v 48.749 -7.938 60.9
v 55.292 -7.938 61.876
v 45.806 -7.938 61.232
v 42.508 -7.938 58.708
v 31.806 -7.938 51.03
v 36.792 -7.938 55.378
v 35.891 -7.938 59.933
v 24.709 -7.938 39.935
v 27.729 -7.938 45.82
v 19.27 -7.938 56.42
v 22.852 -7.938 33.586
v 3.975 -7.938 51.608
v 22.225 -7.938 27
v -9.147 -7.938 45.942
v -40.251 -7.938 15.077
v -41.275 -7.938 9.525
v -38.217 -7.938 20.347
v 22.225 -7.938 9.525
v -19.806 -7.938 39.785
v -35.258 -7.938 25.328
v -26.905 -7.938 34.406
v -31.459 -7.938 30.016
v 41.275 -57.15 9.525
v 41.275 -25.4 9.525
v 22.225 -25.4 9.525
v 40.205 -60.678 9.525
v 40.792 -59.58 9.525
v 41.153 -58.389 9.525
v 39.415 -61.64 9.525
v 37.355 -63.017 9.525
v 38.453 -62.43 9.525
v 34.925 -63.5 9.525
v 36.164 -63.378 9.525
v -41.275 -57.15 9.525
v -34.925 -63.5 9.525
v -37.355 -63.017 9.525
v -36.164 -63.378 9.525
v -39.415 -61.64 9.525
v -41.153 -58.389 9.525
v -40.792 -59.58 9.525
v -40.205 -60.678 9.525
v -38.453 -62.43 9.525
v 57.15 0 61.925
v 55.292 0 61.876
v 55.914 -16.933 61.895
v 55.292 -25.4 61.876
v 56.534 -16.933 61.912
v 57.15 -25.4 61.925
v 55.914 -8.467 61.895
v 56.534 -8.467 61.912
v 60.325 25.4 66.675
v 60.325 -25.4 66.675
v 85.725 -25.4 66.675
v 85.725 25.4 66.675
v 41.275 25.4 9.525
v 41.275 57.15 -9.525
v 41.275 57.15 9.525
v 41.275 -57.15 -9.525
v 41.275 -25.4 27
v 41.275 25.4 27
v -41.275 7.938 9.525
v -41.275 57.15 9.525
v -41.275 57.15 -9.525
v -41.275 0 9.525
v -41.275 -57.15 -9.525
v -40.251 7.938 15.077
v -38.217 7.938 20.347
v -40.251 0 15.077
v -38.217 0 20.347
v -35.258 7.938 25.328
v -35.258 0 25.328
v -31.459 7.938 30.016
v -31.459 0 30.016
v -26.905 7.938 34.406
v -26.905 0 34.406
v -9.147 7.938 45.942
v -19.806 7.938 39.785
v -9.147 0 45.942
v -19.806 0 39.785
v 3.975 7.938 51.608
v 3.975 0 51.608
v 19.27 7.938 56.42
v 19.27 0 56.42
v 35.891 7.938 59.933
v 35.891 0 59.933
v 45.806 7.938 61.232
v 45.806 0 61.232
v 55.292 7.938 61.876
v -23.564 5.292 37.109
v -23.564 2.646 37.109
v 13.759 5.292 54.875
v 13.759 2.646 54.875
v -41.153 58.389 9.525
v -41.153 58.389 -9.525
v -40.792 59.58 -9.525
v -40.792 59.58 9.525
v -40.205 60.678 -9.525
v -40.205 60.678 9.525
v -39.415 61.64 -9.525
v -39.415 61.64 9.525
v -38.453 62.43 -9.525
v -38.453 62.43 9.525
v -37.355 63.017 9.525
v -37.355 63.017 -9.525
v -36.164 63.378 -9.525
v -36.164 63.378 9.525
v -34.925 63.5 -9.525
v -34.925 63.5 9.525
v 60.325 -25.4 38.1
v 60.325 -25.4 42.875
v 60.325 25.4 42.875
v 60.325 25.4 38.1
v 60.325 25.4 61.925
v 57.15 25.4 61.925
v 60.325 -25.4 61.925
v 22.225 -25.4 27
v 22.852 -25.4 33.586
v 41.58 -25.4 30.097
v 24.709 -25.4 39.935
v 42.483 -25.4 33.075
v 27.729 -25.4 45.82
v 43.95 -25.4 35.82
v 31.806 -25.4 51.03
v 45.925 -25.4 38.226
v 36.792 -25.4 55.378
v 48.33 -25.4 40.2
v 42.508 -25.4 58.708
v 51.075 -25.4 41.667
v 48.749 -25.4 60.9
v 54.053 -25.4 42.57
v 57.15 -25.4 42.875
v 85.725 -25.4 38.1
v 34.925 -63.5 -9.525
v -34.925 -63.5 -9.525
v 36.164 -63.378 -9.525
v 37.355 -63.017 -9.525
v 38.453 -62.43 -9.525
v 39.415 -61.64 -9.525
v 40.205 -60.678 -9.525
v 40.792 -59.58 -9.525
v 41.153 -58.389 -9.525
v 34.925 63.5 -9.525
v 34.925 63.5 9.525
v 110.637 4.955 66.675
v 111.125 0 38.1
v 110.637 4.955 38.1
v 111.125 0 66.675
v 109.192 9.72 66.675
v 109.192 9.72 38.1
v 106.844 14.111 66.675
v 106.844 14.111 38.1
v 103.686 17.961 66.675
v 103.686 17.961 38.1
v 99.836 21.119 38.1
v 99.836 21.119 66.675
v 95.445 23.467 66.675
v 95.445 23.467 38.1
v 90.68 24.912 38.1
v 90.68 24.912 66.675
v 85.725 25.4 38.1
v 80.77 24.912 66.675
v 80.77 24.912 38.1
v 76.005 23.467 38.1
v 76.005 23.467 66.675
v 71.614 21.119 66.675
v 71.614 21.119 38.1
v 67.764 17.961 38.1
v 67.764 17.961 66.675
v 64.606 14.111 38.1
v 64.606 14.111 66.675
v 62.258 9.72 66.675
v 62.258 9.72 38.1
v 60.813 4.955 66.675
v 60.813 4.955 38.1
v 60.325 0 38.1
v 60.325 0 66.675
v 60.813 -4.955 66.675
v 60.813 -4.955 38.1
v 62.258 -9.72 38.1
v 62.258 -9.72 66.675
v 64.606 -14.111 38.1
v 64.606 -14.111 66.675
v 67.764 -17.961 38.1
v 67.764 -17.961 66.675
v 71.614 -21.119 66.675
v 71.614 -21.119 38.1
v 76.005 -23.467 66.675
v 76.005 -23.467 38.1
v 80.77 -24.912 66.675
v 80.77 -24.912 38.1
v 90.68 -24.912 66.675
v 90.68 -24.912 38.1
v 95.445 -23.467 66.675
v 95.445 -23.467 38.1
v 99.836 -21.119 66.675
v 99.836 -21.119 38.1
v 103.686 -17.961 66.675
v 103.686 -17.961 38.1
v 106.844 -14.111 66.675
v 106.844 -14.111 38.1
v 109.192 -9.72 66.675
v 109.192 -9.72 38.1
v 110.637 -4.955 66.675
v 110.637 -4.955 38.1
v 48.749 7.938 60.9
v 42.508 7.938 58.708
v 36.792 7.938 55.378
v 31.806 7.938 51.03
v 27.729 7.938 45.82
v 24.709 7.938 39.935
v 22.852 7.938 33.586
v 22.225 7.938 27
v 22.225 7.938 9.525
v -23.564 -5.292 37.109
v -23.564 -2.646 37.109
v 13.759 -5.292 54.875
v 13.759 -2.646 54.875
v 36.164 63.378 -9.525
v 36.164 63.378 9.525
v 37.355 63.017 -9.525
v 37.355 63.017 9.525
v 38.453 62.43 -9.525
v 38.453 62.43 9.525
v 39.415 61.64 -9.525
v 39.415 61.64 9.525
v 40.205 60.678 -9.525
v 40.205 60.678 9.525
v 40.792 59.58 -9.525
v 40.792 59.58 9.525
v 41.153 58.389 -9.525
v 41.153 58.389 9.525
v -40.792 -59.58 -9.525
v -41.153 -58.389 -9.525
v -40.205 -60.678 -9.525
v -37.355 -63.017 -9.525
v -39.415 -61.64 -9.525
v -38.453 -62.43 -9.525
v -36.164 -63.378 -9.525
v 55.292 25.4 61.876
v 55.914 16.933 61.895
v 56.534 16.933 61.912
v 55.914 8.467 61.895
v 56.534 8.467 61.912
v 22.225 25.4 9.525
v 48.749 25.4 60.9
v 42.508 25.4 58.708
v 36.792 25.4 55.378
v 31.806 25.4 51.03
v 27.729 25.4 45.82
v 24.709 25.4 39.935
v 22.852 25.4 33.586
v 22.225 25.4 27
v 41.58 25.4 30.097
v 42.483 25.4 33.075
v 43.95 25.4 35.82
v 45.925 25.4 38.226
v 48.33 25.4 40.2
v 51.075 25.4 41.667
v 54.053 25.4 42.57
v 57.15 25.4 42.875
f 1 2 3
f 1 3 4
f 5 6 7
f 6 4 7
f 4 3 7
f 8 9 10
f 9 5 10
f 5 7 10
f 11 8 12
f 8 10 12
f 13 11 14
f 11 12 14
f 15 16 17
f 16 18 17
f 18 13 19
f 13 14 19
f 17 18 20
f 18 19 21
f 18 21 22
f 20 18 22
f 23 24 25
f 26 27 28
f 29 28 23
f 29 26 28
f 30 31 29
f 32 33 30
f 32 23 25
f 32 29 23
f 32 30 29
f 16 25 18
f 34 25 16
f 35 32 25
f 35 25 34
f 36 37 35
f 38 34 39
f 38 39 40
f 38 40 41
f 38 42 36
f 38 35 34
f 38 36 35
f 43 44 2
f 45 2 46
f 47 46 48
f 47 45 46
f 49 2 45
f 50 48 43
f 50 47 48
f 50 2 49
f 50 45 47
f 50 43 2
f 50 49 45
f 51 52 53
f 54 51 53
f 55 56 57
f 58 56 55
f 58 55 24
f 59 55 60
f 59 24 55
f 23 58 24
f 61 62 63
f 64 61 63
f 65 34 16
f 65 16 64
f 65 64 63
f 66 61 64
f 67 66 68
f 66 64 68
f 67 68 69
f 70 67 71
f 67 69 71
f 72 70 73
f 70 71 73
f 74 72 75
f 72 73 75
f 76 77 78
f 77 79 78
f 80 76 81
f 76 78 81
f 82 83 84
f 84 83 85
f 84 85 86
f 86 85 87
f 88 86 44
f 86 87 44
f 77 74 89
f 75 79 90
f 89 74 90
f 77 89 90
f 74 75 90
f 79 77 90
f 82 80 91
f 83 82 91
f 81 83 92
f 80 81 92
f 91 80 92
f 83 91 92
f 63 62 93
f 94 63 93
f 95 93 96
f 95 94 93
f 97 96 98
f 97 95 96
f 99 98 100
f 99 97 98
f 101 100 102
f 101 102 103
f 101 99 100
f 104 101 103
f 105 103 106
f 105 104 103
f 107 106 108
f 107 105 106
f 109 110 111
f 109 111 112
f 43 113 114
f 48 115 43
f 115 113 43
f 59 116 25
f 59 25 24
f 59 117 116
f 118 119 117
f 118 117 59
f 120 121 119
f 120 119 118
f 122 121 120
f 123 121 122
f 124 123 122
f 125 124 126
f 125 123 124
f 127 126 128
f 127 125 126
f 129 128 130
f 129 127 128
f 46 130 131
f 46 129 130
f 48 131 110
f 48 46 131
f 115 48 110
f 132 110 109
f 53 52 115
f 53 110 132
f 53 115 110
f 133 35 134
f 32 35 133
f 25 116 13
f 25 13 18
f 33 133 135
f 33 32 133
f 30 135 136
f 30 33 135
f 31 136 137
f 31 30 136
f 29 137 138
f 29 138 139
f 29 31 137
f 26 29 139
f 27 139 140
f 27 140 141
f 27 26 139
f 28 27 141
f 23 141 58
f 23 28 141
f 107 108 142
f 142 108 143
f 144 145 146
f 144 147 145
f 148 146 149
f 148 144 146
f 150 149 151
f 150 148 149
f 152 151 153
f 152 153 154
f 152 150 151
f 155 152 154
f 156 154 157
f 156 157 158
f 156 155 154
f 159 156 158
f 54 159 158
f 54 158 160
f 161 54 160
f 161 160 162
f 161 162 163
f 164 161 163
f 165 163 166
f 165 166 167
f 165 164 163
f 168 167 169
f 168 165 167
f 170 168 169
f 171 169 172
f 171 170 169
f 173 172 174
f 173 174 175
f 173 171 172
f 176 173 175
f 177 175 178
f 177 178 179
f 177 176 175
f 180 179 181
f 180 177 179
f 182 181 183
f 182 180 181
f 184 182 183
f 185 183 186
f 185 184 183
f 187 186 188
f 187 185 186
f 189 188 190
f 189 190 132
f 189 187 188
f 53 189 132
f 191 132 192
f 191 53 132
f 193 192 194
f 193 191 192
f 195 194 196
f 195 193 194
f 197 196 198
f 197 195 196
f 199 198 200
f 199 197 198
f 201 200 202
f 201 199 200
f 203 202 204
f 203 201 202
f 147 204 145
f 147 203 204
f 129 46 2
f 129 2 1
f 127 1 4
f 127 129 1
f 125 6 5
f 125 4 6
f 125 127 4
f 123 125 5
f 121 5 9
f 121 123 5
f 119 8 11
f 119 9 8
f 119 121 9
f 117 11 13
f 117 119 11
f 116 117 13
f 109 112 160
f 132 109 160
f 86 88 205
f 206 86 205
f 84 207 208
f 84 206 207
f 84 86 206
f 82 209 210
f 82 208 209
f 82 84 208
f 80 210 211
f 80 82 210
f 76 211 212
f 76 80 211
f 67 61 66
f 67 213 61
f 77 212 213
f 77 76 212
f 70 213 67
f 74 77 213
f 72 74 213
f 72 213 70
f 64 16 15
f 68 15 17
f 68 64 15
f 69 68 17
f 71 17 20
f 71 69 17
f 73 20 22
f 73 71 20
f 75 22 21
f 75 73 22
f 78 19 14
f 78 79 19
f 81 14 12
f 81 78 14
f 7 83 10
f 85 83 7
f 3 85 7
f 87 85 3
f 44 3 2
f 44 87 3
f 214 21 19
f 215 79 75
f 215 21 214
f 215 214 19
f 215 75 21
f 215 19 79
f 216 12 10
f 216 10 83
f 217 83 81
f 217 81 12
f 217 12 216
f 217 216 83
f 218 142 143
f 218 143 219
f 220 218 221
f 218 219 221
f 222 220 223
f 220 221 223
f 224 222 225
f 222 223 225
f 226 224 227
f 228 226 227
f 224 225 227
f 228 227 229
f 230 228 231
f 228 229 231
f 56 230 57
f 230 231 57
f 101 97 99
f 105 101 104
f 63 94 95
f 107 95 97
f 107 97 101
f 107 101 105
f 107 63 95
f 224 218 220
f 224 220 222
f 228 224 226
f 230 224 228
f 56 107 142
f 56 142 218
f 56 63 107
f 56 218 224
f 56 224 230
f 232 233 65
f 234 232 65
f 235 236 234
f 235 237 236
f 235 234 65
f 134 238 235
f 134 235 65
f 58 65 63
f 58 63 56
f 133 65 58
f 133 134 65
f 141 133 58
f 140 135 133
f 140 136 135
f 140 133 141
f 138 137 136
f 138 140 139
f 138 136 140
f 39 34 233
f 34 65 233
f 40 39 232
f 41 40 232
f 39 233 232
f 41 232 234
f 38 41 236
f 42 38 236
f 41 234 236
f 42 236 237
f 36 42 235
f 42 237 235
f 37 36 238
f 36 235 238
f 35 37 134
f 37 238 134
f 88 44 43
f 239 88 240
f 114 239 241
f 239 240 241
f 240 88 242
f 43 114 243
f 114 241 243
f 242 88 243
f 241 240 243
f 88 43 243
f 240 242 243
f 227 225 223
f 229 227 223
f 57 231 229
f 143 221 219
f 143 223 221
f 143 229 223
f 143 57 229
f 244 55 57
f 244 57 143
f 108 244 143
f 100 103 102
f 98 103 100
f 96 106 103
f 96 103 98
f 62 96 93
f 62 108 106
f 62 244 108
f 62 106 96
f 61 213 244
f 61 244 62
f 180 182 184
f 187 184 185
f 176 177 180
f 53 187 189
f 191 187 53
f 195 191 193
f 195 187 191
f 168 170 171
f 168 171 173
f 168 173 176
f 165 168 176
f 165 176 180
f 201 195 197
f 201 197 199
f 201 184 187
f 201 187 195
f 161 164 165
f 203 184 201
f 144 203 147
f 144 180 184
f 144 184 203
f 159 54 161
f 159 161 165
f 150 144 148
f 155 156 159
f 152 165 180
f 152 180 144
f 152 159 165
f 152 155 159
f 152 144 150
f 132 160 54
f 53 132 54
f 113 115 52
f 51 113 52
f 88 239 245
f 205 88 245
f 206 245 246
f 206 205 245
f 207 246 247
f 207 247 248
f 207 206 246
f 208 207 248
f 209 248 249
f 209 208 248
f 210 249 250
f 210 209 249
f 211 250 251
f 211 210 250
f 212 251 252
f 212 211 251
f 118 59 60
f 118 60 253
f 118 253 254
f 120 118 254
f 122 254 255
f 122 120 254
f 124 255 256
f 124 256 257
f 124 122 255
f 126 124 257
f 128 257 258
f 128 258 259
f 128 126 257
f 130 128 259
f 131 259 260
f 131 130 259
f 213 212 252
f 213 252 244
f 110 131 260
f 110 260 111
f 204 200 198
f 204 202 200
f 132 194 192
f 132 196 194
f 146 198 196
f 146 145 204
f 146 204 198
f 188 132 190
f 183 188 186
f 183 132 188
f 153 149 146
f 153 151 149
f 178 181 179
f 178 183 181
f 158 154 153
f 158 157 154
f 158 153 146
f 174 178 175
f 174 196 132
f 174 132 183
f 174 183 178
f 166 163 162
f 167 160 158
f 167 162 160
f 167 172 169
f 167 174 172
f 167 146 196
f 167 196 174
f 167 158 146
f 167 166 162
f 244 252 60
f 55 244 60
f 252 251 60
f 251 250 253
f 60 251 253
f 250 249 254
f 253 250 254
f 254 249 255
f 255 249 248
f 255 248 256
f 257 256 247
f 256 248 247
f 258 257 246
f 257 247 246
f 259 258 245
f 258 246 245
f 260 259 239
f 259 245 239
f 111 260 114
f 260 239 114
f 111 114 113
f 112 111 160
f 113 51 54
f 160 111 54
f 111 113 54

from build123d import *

# Parameters (mm, degrees)
F1_DEPTH = 63.5
F0_W     = 25.4
F0_H     = 4.7498
F2_DEPTH = 25.4
F3_DEPTH = 7.9375
F5_R     = 6.35


with BuildPart() as f1:
    # F0 (on Front) → F1 (new body, symmetric)
    with BuildSketch(Plane.XZ):
        Polygon((22.225, 9.525), (-41.275, 9.525), (-41.275, -9.525), (41.275, -9.525), (41.275, 9.525), align=None)
    extrude(amount=F1_DEPTH, both=True)

    # F0 (on Front) → F2 (join, symmetric)
    with BuildSketch(Plane.XZ):
        with BuildLine():
            Line((22.225, 27.0002), (22.225, 9.525))
            Line((22.225, 9.525), (41.275, 9.525))
            Line((41.275, 9.525), (41.275, 27.0002))
            ThreePointArc((41.275, 27.0002), (45.9246798487, 38.2255201513), (57.15, 42.8752))
            Line((57.15, 42.8752), (60.325, 42.8752))
            Line((60.325, 42.8752), (60.325, 61.9252))
            Line((60.325, 61.9252), (57.15, 61.9252))
            add(Edge.make_bspline(
                [(55.2920610912, 61.875745702), (55.9158793834, 61.8968482356), (56.5352906086, 61.9133390458), (57.15, 61.9252)],
                knots=[109.7267842617, 109.7267842617, 109.7267842617, 109.7267842617, 111.5045361635, 111.5045361635, 111.5045361635, 111.5045361635], degree=3))
            ThreePointArc((55.2920610912, 61.875745702), (31.80592632, 51.0300471553), (22.225, 27.0002))
        make_face()
        Polygon((85.725, 61.9252), (60.325, 61.9252), (60.325, 42.8752), (60.325, 38.1), (85.725, 38.1), align=None)
        with Locations((73.025, 64.3001)):
            Rectangle(F0_W, F0_H)
    extrude(amount=F2_DEPTH, both=True)

    # F0 (on Front) → F3 (join, symmetric)
    with BuildSketch(Plane.XZ):
        with BuildLine():
            add(Edge.make_bspline(
                [(-41.275, 9.525), (-38.5041339156, 41.7017871953), (16.7886146349, 60.5732505935), (55.2920610912, 61.875745702)],
                knots=[0, 0, 0, 0, 109.7267842617, 109.7267842617, 109.7267842617, 109.7267842617], degree=3))
            Line((-41.275, 9.525), (22.225, 9.525))
            Line((22.225, 9.525), (22.225, 27.0002))
            ThreePointArc((22.225, 27.0002), (31.80592632, 51.0300471553), (55.2920610912, 61.875745702))
        make_face()
    extrude(amount=F3_DEPTH, both=True)

    # F5
    f5_edges = [f1.edges().sort_by_distance(p)[0] for p in [
        (41.275, -63.5, 0),
        (-41.275, -63.5, 0),
        (-41.275, 63.5, 0),
        (41.275, 63.5, 0),
    ]]
    fillet(f5_edges, radius=F5_R)


with BuildPart() as f4:
    # F0 (on Front) → F4 (revolve)
    with BuildSketch(Plane.XZ):
        Polygon((85.725, 66.675), (85.725, 61.9252), (85.725, 38.1), (111.125, 38.1), (111.125, 66.675), align=None)
    revolve(axis=Axis((85.725, 0, 52.3875), (0, 0, 1)))


solid = Compound([f1.part, f4.part])
